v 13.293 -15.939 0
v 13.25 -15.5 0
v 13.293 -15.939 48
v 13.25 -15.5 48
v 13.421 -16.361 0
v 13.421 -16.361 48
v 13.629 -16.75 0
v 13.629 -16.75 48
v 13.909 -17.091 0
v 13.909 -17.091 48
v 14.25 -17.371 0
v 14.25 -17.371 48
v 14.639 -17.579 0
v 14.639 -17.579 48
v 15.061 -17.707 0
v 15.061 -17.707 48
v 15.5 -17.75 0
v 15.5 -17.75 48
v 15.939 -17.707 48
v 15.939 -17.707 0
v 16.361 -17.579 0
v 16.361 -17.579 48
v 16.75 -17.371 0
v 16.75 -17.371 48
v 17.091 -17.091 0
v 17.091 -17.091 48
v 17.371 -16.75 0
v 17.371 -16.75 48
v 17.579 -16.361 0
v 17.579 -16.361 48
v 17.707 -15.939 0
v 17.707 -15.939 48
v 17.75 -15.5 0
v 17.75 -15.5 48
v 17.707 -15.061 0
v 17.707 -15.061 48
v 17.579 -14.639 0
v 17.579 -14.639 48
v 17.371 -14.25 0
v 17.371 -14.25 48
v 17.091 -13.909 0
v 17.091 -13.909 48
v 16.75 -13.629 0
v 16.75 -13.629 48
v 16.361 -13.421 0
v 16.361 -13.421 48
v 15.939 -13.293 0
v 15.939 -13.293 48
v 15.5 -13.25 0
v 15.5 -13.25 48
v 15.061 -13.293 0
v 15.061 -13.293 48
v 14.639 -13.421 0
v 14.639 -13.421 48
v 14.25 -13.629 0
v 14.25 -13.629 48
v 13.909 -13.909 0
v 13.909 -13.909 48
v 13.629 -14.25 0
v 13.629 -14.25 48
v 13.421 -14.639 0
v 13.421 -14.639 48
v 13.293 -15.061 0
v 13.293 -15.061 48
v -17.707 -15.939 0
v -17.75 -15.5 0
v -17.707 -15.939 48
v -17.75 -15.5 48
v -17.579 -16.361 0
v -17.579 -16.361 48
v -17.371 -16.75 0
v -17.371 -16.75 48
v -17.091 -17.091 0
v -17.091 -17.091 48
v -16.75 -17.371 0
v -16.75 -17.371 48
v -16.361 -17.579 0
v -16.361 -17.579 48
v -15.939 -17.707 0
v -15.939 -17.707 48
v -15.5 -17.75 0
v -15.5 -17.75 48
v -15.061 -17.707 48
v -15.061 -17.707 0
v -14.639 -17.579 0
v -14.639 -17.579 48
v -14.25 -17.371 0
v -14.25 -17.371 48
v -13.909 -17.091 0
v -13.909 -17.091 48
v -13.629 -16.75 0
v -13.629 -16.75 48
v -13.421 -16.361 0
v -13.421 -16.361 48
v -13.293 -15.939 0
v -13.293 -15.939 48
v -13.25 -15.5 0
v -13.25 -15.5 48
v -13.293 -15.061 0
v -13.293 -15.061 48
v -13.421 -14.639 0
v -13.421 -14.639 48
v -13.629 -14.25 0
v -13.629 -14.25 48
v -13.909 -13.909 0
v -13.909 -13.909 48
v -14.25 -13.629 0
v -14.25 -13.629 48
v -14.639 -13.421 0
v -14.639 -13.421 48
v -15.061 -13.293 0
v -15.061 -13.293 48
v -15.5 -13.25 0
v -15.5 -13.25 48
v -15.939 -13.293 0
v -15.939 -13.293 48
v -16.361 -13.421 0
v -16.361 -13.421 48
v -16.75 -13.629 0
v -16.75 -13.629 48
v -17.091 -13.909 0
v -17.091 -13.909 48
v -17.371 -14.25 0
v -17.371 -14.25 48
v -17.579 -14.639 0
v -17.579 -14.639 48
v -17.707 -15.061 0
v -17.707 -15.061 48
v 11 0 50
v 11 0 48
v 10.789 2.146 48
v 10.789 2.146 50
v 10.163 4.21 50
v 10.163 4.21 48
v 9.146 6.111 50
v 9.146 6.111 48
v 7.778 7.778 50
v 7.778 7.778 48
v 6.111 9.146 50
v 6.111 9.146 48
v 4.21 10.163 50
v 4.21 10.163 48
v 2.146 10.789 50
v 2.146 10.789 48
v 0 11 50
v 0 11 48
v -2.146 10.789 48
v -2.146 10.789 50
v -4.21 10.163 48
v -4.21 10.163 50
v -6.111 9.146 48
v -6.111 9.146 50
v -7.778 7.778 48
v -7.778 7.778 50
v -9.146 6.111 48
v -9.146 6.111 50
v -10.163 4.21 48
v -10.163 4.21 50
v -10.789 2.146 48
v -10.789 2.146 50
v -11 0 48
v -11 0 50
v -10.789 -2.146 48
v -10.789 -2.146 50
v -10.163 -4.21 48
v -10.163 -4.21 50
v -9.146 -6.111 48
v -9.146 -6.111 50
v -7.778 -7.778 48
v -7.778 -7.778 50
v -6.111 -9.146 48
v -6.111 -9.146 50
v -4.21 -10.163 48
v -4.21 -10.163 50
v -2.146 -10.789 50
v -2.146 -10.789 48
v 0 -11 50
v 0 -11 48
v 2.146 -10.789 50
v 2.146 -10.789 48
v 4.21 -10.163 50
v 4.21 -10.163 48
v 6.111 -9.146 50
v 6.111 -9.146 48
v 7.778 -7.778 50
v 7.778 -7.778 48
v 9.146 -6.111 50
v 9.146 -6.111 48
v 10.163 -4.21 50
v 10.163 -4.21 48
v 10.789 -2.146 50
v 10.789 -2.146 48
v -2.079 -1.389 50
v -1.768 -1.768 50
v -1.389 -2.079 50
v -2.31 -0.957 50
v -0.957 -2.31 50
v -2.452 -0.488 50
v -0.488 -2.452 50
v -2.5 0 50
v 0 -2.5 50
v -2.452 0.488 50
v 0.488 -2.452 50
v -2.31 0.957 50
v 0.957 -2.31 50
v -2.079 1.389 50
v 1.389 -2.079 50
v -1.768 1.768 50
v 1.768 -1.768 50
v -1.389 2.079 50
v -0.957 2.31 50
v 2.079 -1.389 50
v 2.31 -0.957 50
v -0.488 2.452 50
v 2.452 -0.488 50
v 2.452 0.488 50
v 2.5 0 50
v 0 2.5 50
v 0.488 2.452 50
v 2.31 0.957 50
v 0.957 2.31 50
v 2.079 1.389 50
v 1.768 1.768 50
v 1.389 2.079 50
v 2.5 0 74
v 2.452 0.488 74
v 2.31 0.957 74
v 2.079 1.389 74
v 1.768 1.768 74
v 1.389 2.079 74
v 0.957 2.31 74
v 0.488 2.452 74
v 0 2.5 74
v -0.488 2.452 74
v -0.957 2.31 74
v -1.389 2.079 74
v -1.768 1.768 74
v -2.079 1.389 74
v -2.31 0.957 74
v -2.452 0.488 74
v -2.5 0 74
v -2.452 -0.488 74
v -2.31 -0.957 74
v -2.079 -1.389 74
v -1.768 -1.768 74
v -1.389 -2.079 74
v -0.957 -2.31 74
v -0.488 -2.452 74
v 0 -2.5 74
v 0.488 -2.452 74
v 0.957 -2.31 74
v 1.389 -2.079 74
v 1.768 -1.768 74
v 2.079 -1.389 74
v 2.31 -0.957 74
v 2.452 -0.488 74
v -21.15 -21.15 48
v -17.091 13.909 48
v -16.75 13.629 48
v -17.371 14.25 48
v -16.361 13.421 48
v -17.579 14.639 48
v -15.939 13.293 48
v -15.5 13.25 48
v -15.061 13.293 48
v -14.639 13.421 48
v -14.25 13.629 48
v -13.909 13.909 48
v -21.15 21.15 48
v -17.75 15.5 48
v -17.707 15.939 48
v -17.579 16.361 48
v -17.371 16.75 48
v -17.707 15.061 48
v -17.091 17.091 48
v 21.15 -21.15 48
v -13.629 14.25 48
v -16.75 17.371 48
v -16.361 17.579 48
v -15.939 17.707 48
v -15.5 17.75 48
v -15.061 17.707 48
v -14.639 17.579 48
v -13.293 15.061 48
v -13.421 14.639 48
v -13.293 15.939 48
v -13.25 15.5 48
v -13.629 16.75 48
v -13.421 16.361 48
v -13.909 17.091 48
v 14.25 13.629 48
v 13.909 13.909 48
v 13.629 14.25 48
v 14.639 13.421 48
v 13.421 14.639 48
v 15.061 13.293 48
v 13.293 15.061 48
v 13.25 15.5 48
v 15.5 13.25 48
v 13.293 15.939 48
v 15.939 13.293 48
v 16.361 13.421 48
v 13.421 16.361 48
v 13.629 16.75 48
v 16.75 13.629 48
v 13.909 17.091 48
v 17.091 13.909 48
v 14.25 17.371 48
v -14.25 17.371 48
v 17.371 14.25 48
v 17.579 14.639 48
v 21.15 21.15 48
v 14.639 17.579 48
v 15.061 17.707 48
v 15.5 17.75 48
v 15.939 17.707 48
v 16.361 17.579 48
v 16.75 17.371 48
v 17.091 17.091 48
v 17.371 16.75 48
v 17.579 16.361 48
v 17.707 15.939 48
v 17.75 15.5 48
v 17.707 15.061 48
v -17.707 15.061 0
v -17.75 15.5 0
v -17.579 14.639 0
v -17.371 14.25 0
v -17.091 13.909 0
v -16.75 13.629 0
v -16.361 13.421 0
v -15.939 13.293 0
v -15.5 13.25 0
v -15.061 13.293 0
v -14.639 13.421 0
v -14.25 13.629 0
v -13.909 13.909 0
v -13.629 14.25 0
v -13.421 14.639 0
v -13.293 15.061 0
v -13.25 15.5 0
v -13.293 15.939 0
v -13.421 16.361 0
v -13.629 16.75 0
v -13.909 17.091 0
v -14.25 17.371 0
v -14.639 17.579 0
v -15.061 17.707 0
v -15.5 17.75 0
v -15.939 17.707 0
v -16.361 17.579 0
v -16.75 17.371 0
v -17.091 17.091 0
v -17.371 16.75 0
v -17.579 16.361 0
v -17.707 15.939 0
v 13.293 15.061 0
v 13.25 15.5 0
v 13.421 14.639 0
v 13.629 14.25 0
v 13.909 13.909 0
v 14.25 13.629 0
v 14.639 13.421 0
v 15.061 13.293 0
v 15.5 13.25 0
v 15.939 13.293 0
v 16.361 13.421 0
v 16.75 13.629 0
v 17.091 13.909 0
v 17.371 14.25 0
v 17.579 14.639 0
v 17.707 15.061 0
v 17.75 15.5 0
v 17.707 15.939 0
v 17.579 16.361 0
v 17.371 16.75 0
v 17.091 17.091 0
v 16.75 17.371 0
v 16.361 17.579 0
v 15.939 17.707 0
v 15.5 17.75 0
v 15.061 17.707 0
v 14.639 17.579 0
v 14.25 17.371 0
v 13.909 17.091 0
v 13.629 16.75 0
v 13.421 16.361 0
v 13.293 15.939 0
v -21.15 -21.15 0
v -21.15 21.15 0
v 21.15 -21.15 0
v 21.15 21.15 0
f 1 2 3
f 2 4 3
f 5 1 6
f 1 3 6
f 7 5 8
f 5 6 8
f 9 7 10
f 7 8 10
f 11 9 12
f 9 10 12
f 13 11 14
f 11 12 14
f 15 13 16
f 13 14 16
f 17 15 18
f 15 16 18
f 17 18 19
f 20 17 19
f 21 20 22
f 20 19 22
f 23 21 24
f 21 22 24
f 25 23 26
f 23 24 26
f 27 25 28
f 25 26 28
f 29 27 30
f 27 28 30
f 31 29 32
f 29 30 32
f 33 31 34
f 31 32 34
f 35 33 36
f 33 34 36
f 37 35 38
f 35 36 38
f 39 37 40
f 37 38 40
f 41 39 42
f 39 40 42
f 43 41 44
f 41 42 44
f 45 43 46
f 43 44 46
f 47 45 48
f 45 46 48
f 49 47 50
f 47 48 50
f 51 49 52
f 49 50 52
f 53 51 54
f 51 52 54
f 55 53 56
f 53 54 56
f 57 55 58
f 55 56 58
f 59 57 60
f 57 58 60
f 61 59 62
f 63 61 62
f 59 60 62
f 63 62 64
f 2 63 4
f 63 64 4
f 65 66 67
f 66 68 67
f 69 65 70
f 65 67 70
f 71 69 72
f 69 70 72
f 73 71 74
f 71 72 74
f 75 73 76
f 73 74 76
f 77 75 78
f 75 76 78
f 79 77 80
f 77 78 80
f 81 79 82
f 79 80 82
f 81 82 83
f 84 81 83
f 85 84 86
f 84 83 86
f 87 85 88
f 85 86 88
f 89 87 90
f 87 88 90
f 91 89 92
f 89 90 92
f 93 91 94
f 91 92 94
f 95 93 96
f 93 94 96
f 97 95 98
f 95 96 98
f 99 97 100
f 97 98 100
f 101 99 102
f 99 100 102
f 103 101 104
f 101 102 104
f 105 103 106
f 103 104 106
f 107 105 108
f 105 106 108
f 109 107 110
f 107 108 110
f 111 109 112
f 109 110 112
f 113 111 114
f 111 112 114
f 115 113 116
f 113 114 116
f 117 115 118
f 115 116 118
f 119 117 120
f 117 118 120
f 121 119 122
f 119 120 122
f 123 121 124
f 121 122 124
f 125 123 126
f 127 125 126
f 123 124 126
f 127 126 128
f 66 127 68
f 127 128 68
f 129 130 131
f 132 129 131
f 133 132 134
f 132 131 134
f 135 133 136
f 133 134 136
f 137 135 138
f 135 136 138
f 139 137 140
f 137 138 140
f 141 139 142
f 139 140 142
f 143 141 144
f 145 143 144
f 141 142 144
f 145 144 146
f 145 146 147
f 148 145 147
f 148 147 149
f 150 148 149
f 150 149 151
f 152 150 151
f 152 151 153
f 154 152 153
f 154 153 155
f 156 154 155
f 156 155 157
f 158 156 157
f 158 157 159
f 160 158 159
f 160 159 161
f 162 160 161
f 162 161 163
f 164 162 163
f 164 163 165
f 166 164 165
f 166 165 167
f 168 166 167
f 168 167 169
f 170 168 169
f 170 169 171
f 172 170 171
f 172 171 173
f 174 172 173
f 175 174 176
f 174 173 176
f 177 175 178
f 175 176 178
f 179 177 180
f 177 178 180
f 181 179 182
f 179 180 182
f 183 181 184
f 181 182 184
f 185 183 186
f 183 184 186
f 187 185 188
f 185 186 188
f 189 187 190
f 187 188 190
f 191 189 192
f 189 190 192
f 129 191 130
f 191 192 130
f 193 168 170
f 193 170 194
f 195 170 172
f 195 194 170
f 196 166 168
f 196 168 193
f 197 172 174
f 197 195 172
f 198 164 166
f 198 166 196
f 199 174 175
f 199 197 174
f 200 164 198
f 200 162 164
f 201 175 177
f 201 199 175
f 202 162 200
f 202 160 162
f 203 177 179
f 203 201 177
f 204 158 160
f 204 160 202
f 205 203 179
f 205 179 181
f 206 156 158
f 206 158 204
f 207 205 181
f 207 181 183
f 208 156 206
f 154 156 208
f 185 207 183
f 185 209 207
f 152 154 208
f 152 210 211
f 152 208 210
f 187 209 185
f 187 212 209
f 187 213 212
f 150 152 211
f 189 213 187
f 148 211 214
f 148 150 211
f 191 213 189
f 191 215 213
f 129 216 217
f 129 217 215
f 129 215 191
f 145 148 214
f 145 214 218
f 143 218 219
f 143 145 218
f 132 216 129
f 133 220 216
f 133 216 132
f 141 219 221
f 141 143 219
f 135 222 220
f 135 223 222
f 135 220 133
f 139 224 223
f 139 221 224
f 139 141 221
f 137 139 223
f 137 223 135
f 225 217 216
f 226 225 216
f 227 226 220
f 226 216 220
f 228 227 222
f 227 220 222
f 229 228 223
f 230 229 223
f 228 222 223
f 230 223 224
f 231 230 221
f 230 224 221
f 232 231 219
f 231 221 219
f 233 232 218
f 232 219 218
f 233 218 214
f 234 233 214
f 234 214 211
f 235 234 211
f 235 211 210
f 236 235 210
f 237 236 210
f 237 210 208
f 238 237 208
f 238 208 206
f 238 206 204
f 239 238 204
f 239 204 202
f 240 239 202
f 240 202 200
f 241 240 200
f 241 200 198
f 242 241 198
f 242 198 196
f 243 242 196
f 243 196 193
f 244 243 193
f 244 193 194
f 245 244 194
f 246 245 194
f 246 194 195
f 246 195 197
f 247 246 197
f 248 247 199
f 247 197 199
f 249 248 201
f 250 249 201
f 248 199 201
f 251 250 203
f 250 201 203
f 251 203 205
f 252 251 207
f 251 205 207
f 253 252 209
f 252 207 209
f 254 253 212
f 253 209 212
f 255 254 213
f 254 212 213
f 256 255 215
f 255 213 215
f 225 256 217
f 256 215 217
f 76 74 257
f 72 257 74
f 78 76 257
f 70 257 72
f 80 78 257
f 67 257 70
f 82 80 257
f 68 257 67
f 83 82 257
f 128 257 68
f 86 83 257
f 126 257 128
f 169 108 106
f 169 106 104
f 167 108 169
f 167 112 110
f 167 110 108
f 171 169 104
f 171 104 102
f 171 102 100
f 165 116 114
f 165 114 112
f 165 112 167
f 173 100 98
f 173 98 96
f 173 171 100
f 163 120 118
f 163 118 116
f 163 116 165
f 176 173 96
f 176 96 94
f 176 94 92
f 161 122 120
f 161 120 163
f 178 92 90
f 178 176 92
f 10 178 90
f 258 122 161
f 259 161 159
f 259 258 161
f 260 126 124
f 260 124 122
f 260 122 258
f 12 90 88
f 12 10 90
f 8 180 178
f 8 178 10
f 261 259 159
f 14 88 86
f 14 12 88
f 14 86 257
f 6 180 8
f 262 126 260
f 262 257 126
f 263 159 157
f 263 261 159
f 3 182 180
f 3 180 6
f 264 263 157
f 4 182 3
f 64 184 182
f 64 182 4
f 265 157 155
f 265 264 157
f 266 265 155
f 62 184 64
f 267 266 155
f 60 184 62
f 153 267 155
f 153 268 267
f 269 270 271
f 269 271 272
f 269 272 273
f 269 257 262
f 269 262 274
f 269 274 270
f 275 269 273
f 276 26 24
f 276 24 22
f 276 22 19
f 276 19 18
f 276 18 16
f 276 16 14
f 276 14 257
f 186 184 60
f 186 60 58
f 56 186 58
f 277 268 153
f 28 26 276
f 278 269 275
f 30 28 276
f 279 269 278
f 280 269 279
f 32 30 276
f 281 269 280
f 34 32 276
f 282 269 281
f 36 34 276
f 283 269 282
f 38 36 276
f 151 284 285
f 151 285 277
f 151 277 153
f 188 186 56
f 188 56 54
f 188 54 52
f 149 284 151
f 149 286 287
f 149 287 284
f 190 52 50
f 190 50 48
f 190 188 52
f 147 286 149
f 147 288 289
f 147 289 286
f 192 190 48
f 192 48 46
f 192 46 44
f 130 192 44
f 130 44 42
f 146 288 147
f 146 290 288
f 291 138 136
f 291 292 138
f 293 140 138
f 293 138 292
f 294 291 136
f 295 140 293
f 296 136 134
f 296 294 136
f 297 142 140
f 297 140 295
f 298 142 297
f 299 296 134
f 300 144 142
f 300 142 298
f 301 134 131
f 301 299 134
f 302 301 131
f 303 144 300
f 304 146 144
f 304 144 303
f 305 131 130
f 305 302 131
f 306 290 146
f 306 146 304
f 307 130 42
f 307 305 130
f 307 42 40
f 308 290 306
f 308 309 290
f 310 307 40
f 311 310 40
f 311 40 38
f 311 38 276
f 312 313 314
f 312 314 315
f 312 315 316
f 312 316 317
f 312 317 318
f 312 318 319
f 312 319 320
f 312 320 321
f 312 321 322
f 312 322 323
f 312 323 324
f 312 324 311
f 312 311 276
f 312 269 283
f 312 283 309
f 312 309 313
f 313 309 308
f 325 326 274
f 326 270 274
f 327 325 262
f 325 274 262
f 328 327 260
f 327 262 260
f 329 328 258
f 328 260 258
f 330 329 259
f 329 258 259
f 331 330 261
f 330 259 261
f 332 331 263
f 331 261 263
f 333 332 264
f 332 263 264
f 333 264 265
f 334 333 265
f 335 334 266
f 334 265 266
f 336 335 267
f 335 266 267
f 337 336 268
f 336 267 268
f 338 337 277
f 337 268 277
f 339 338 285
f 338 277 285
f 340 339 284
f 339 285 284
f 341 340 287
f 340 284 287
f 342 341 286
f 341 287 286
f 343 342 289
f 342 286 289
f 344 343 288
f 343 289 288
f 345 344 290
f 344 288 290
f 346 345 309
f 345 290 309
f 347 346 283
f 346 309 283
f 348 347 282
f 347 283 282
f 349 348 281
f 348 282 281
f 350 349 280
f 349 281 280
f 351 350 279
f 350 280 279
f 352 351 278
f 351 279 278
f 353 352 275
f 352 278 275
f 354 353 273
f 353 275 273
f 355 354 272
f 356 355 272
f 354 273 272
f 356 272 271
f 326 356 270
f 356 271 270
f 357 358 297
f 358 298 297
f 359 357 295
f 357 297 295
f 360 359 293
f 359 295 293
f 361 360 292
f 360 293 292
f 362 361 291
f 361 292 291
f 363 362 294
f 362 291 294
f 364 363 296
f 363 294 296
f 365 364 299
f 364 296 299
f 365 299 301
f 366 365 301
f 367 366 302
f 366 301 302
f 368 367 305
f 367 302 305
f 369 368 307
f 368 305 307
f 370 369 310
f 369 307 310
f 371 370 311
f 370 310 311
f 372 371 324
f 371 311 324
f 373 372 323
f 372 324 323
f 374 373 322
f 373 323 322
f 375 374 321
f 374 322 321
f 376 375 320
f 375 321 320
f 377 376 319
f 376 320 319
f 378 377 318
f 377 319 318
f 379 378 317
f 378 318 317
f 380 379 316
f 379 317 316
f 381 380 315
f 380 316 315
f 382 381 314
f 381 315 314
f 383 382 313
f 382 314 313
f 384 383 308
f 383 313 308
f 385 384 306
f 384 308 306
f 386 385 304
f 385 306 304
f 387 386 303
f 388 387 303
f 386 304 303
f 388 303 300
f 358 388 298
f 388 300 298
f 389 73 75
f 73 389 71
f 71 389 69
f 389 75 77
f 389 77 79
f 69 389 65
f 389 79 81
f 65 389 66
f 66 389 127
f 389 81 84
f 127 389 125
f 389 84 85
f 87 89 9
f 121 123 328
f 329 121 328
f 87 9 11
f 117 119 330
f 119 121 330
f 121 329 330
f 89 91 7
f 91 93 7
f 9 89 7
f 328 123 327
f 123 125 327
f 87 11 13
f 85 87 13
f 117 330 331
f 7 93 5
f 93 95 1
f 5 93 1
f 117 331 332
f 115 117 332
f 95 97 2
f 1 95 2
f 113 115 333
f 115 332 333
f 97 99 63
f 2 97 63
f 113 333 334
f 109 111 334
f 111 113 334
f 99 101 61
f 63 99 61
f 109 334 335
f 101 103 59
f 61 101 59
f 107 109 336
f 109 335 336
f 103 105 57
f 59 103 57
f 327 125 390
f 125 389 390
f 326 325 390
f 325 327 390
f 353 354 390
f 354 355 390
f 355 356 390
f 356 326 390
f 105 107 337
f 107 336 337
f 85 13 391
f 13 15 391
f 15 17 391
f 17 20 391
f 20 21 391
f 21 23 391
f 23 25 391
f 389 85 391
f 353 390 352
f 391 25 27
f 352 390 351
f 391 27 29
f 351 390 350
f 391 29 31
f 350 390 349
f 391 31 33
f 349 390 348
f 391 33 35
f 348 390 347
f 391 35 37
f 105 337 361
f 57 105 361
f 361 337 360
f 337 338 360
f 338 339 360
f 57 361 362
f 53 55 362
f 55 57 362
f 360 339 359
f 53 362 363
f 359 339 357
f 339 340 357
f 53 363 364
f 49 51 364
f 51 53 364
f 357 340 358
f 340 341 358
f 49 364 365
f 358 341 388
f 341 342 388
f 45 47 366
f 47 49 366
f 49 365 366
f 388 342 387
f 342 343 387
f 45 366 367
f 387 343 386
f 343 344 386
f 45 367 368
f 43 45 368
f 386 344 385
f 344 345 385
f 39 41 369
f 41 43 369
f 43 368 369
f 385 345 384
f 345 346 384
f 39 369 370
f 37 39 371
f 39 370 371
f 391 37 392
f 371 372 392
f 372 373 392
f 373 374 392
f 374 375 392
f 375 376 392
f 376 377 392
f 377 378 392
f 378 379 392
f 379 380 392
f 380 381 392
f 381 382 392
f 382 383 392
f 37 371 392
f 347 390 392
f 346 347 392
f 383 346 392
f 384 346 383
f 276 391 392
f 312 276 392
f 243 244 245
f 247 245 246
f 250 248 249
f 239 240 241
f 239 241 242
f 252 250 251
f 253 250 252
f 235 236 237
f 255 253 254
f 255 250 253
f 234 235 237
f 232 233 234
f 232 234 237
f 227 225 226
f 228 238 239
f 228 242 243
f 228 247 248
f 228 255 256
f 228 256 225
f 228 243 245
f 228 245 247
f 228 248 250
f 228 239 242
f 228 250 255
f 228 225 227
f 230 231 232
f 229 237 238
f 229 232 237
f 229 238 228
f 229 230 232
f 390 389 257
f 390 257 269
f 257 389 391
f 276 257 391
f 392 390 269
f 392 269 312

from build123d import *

# Parameters (mm, degrees)
F4_W     = 42.3
F4_H     = 42.3
F4_R     = 11
F5_DEPTH = 48
F4_R_2   = 2.5
F6_DEPTH = 50
F7_DEPTH = 74
F8_D     = 4.5
F8_DEPTH = 48
F8_TIP   = 1.3519363928


with BuildPart() as f5:
    # F4 (on Top) → F5 (new body)
    with BuildSketch(Plane.XY):
        Rectangle(F4_W, F4_H)
        Circle(F4_R, mode=Mode.SUBTRACT)
    extrude(amount=F5_DEPTH)

    # F4 (on Top) → F6 (join)
    with BuildSketch(Plane.XY):
        Circle(F4_R)
        Circle(F4_R_2, mode=Mode.SUBTRACT)
    extrude(amount=F6_DEPTH)

    # F4 (on Top) → F7 (join)
    with BuildSketch(Plane.XY):
        Circle(F4_R_2)
    extrude(amount=F7_DEPTH)

    # F8
    with Locations(Plane(origin=(0, 0, 0), x_dir=(1, 0, 0), z_dir=(0, 0, -1))):
        with Locations((15.5, -15.5), (-15.5, -15.5), (-15.5, 15.5), (15.5, 15.5)):
            Hole(F8_D / 2, depth=F8_DEPTH)
            with Locations((0, 0, -(F8_DEPTH + F8_TIP / 2))):  # 118° drill point
                Cone(0, F8_D / 2, F8_TIP, mode=Mode.SUBTRACT)


solid = f5.part
